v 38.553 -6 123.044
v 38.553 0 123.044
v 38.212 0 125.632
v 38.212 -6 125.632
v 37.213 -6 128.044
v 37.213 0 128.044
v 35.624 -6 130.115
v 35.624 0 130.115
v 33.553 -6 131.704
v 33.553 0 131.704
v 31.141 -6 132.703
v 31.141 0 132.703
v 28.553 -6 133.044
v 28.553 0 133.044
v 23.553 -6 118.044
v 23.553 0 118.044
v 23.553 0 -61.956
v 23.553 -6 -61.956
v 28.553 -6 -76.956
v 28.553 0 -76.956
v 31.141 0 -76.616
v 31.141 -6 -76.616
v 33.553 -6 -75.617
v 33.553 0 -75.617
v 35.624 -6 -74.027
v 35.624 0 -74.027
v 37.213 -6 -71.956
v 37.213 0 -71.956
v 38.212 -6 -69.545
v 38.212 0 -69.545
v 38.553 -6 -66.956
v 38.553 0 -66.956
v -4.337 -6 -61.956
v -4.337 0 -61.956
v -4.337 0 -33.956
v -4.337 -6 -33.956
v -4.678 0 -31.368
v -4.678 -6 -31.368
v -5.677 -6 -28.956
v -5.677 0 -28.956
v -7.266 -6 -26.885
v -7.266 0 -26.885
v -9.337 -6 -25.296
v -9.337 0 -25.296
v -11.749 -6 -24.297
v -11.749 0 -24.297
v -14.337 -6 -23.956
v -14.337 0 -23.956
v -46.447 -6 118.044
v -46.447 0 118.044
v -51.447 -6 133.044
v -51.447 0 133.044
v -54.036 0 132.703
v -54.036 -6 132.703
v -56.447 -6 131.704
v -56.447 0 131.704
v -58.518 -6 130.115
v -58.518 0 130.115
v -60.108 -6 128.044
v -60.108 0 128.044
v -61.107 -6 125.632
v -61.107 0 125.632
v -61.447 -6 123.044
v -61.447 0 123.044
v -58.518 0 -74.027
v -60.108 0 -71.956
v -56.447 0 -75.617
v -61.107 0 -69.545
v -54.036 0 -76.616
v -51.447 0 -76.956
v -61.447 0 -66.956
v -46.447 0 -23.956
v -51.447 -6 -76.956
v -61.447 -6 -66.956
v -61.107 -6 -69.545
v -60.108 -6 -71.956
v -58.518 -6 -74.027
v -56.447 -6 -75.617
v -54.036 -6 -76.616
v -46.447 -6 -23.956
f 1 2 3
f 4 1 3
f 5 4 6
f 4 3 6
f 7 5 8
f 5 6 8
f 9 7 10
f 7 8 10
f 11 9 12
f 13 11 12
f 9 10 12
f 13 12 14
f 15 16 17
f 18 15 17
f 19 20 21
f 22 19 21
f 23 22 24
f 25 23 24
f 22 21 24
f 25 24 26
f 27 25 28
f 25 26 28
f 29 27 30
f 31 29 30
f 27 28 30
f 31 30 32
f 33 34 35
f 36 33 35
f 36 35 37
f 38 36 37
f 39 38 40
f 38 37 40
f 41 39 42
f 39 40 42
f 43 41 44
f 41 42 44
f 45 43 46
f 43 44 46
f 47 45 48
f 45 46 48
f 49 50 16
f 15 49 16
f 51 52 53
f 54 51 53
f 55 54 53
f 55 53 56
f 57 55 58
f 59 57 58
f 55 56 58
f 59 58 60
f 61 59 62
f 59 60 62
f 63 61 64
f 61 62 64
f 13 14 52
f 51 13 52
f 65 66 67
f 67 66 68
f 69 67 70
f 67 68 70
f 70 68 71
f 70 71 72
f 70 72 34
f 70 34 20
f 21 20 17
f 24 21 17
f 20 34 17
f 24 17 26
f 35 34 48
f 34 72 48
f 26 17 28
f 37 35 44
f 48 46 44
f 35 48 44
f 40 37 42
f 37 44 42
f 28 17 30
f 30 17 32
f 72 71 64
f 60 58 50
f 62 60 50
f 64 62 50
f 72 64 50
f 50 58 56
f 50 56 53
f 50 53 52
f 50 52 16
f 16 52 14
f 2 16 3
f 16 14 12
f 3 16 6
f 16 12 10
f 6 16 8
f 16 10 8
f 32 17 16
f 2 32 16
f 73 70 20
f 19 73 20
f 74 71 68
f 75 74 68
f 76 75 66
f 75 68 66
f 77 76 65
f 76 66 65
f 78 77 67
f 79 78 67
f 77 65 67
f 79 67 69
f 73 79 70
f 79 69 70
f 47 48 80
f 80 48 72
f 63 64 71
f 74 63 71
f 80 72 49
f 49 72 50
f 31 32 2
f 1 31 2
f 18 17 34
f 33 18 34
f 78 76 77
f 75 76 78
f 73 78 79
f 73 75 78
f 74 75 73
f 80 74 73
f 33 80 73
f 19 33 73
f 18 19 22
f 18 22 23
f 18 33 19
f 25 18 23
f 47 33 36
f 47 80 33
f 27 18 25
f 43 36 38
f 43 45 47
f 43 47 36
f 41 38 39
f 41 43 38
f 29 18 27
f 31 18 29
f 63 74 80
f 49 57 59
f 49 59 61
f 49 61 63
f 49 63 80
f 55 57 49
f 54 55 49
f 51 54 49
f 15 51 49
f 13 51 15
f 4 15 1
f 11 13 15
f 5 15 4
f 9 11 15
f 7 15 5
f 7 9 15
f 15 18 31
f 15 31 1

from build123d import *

# Parameters (mm, degrees)
F1_DEPTH = 6


with BuildPart() as f1:
    # F0 (on Front) → F1 (new body)
    with BuildSketch(Plane.XZ):
        with BuildLine():
            Line((28.552629, 133.043638), (-51.447371, 133.043638))
            ThreePointArc((-51.447371, 133.043638), (-58.518439, 130.114706), (-61.447371, 123.043638))
            Line((-61.447371, 123.043638), (-61.447371, -66.956362))
            ThreePointArc((-61.447371, -66.956362), (-58.518439, -74.027429), (-51.447371, -76.956362))
            Line((-51.447371, -76.956362), (28.552629, -76.956362))
            ThreePointArc((28.552629, -76.956362), (35.623697, -74.027429), (38.552629, -66.956362))
            Line((38.552629, -66.956362), (38.552629, 123.043638))
            ThreePointArc((38.552629, 123.043638), (35.623697, 130.114706), (28.552629, 133.043638))
        make_face()
        with BuildLine():
            Line((-46.447371, -23.956362), (-46.447371, 118.043638))
            Line((-46.447371, 118.043638), (23.552629, 118.043638))
            Line((23.552629, 118.043638), (23.552629, -61.956362))
            Line((23.552629, -61.956362), (-4.337173, -61.956362))
            Line((-4.337173, -61.956362), (-4.337173, -33.956362))
            ThreePointArc((-4.337173, -33.956362), (-7.266106, -26.885294), (-14.337173, -23.956362))
            Line((-14.337173, -23.956362), (-46.447371, -23.956362))
        make_face(mode=Mode.SUBTRACT)
    extrude(amount=F1_DEPTH)


solid = f1.part
